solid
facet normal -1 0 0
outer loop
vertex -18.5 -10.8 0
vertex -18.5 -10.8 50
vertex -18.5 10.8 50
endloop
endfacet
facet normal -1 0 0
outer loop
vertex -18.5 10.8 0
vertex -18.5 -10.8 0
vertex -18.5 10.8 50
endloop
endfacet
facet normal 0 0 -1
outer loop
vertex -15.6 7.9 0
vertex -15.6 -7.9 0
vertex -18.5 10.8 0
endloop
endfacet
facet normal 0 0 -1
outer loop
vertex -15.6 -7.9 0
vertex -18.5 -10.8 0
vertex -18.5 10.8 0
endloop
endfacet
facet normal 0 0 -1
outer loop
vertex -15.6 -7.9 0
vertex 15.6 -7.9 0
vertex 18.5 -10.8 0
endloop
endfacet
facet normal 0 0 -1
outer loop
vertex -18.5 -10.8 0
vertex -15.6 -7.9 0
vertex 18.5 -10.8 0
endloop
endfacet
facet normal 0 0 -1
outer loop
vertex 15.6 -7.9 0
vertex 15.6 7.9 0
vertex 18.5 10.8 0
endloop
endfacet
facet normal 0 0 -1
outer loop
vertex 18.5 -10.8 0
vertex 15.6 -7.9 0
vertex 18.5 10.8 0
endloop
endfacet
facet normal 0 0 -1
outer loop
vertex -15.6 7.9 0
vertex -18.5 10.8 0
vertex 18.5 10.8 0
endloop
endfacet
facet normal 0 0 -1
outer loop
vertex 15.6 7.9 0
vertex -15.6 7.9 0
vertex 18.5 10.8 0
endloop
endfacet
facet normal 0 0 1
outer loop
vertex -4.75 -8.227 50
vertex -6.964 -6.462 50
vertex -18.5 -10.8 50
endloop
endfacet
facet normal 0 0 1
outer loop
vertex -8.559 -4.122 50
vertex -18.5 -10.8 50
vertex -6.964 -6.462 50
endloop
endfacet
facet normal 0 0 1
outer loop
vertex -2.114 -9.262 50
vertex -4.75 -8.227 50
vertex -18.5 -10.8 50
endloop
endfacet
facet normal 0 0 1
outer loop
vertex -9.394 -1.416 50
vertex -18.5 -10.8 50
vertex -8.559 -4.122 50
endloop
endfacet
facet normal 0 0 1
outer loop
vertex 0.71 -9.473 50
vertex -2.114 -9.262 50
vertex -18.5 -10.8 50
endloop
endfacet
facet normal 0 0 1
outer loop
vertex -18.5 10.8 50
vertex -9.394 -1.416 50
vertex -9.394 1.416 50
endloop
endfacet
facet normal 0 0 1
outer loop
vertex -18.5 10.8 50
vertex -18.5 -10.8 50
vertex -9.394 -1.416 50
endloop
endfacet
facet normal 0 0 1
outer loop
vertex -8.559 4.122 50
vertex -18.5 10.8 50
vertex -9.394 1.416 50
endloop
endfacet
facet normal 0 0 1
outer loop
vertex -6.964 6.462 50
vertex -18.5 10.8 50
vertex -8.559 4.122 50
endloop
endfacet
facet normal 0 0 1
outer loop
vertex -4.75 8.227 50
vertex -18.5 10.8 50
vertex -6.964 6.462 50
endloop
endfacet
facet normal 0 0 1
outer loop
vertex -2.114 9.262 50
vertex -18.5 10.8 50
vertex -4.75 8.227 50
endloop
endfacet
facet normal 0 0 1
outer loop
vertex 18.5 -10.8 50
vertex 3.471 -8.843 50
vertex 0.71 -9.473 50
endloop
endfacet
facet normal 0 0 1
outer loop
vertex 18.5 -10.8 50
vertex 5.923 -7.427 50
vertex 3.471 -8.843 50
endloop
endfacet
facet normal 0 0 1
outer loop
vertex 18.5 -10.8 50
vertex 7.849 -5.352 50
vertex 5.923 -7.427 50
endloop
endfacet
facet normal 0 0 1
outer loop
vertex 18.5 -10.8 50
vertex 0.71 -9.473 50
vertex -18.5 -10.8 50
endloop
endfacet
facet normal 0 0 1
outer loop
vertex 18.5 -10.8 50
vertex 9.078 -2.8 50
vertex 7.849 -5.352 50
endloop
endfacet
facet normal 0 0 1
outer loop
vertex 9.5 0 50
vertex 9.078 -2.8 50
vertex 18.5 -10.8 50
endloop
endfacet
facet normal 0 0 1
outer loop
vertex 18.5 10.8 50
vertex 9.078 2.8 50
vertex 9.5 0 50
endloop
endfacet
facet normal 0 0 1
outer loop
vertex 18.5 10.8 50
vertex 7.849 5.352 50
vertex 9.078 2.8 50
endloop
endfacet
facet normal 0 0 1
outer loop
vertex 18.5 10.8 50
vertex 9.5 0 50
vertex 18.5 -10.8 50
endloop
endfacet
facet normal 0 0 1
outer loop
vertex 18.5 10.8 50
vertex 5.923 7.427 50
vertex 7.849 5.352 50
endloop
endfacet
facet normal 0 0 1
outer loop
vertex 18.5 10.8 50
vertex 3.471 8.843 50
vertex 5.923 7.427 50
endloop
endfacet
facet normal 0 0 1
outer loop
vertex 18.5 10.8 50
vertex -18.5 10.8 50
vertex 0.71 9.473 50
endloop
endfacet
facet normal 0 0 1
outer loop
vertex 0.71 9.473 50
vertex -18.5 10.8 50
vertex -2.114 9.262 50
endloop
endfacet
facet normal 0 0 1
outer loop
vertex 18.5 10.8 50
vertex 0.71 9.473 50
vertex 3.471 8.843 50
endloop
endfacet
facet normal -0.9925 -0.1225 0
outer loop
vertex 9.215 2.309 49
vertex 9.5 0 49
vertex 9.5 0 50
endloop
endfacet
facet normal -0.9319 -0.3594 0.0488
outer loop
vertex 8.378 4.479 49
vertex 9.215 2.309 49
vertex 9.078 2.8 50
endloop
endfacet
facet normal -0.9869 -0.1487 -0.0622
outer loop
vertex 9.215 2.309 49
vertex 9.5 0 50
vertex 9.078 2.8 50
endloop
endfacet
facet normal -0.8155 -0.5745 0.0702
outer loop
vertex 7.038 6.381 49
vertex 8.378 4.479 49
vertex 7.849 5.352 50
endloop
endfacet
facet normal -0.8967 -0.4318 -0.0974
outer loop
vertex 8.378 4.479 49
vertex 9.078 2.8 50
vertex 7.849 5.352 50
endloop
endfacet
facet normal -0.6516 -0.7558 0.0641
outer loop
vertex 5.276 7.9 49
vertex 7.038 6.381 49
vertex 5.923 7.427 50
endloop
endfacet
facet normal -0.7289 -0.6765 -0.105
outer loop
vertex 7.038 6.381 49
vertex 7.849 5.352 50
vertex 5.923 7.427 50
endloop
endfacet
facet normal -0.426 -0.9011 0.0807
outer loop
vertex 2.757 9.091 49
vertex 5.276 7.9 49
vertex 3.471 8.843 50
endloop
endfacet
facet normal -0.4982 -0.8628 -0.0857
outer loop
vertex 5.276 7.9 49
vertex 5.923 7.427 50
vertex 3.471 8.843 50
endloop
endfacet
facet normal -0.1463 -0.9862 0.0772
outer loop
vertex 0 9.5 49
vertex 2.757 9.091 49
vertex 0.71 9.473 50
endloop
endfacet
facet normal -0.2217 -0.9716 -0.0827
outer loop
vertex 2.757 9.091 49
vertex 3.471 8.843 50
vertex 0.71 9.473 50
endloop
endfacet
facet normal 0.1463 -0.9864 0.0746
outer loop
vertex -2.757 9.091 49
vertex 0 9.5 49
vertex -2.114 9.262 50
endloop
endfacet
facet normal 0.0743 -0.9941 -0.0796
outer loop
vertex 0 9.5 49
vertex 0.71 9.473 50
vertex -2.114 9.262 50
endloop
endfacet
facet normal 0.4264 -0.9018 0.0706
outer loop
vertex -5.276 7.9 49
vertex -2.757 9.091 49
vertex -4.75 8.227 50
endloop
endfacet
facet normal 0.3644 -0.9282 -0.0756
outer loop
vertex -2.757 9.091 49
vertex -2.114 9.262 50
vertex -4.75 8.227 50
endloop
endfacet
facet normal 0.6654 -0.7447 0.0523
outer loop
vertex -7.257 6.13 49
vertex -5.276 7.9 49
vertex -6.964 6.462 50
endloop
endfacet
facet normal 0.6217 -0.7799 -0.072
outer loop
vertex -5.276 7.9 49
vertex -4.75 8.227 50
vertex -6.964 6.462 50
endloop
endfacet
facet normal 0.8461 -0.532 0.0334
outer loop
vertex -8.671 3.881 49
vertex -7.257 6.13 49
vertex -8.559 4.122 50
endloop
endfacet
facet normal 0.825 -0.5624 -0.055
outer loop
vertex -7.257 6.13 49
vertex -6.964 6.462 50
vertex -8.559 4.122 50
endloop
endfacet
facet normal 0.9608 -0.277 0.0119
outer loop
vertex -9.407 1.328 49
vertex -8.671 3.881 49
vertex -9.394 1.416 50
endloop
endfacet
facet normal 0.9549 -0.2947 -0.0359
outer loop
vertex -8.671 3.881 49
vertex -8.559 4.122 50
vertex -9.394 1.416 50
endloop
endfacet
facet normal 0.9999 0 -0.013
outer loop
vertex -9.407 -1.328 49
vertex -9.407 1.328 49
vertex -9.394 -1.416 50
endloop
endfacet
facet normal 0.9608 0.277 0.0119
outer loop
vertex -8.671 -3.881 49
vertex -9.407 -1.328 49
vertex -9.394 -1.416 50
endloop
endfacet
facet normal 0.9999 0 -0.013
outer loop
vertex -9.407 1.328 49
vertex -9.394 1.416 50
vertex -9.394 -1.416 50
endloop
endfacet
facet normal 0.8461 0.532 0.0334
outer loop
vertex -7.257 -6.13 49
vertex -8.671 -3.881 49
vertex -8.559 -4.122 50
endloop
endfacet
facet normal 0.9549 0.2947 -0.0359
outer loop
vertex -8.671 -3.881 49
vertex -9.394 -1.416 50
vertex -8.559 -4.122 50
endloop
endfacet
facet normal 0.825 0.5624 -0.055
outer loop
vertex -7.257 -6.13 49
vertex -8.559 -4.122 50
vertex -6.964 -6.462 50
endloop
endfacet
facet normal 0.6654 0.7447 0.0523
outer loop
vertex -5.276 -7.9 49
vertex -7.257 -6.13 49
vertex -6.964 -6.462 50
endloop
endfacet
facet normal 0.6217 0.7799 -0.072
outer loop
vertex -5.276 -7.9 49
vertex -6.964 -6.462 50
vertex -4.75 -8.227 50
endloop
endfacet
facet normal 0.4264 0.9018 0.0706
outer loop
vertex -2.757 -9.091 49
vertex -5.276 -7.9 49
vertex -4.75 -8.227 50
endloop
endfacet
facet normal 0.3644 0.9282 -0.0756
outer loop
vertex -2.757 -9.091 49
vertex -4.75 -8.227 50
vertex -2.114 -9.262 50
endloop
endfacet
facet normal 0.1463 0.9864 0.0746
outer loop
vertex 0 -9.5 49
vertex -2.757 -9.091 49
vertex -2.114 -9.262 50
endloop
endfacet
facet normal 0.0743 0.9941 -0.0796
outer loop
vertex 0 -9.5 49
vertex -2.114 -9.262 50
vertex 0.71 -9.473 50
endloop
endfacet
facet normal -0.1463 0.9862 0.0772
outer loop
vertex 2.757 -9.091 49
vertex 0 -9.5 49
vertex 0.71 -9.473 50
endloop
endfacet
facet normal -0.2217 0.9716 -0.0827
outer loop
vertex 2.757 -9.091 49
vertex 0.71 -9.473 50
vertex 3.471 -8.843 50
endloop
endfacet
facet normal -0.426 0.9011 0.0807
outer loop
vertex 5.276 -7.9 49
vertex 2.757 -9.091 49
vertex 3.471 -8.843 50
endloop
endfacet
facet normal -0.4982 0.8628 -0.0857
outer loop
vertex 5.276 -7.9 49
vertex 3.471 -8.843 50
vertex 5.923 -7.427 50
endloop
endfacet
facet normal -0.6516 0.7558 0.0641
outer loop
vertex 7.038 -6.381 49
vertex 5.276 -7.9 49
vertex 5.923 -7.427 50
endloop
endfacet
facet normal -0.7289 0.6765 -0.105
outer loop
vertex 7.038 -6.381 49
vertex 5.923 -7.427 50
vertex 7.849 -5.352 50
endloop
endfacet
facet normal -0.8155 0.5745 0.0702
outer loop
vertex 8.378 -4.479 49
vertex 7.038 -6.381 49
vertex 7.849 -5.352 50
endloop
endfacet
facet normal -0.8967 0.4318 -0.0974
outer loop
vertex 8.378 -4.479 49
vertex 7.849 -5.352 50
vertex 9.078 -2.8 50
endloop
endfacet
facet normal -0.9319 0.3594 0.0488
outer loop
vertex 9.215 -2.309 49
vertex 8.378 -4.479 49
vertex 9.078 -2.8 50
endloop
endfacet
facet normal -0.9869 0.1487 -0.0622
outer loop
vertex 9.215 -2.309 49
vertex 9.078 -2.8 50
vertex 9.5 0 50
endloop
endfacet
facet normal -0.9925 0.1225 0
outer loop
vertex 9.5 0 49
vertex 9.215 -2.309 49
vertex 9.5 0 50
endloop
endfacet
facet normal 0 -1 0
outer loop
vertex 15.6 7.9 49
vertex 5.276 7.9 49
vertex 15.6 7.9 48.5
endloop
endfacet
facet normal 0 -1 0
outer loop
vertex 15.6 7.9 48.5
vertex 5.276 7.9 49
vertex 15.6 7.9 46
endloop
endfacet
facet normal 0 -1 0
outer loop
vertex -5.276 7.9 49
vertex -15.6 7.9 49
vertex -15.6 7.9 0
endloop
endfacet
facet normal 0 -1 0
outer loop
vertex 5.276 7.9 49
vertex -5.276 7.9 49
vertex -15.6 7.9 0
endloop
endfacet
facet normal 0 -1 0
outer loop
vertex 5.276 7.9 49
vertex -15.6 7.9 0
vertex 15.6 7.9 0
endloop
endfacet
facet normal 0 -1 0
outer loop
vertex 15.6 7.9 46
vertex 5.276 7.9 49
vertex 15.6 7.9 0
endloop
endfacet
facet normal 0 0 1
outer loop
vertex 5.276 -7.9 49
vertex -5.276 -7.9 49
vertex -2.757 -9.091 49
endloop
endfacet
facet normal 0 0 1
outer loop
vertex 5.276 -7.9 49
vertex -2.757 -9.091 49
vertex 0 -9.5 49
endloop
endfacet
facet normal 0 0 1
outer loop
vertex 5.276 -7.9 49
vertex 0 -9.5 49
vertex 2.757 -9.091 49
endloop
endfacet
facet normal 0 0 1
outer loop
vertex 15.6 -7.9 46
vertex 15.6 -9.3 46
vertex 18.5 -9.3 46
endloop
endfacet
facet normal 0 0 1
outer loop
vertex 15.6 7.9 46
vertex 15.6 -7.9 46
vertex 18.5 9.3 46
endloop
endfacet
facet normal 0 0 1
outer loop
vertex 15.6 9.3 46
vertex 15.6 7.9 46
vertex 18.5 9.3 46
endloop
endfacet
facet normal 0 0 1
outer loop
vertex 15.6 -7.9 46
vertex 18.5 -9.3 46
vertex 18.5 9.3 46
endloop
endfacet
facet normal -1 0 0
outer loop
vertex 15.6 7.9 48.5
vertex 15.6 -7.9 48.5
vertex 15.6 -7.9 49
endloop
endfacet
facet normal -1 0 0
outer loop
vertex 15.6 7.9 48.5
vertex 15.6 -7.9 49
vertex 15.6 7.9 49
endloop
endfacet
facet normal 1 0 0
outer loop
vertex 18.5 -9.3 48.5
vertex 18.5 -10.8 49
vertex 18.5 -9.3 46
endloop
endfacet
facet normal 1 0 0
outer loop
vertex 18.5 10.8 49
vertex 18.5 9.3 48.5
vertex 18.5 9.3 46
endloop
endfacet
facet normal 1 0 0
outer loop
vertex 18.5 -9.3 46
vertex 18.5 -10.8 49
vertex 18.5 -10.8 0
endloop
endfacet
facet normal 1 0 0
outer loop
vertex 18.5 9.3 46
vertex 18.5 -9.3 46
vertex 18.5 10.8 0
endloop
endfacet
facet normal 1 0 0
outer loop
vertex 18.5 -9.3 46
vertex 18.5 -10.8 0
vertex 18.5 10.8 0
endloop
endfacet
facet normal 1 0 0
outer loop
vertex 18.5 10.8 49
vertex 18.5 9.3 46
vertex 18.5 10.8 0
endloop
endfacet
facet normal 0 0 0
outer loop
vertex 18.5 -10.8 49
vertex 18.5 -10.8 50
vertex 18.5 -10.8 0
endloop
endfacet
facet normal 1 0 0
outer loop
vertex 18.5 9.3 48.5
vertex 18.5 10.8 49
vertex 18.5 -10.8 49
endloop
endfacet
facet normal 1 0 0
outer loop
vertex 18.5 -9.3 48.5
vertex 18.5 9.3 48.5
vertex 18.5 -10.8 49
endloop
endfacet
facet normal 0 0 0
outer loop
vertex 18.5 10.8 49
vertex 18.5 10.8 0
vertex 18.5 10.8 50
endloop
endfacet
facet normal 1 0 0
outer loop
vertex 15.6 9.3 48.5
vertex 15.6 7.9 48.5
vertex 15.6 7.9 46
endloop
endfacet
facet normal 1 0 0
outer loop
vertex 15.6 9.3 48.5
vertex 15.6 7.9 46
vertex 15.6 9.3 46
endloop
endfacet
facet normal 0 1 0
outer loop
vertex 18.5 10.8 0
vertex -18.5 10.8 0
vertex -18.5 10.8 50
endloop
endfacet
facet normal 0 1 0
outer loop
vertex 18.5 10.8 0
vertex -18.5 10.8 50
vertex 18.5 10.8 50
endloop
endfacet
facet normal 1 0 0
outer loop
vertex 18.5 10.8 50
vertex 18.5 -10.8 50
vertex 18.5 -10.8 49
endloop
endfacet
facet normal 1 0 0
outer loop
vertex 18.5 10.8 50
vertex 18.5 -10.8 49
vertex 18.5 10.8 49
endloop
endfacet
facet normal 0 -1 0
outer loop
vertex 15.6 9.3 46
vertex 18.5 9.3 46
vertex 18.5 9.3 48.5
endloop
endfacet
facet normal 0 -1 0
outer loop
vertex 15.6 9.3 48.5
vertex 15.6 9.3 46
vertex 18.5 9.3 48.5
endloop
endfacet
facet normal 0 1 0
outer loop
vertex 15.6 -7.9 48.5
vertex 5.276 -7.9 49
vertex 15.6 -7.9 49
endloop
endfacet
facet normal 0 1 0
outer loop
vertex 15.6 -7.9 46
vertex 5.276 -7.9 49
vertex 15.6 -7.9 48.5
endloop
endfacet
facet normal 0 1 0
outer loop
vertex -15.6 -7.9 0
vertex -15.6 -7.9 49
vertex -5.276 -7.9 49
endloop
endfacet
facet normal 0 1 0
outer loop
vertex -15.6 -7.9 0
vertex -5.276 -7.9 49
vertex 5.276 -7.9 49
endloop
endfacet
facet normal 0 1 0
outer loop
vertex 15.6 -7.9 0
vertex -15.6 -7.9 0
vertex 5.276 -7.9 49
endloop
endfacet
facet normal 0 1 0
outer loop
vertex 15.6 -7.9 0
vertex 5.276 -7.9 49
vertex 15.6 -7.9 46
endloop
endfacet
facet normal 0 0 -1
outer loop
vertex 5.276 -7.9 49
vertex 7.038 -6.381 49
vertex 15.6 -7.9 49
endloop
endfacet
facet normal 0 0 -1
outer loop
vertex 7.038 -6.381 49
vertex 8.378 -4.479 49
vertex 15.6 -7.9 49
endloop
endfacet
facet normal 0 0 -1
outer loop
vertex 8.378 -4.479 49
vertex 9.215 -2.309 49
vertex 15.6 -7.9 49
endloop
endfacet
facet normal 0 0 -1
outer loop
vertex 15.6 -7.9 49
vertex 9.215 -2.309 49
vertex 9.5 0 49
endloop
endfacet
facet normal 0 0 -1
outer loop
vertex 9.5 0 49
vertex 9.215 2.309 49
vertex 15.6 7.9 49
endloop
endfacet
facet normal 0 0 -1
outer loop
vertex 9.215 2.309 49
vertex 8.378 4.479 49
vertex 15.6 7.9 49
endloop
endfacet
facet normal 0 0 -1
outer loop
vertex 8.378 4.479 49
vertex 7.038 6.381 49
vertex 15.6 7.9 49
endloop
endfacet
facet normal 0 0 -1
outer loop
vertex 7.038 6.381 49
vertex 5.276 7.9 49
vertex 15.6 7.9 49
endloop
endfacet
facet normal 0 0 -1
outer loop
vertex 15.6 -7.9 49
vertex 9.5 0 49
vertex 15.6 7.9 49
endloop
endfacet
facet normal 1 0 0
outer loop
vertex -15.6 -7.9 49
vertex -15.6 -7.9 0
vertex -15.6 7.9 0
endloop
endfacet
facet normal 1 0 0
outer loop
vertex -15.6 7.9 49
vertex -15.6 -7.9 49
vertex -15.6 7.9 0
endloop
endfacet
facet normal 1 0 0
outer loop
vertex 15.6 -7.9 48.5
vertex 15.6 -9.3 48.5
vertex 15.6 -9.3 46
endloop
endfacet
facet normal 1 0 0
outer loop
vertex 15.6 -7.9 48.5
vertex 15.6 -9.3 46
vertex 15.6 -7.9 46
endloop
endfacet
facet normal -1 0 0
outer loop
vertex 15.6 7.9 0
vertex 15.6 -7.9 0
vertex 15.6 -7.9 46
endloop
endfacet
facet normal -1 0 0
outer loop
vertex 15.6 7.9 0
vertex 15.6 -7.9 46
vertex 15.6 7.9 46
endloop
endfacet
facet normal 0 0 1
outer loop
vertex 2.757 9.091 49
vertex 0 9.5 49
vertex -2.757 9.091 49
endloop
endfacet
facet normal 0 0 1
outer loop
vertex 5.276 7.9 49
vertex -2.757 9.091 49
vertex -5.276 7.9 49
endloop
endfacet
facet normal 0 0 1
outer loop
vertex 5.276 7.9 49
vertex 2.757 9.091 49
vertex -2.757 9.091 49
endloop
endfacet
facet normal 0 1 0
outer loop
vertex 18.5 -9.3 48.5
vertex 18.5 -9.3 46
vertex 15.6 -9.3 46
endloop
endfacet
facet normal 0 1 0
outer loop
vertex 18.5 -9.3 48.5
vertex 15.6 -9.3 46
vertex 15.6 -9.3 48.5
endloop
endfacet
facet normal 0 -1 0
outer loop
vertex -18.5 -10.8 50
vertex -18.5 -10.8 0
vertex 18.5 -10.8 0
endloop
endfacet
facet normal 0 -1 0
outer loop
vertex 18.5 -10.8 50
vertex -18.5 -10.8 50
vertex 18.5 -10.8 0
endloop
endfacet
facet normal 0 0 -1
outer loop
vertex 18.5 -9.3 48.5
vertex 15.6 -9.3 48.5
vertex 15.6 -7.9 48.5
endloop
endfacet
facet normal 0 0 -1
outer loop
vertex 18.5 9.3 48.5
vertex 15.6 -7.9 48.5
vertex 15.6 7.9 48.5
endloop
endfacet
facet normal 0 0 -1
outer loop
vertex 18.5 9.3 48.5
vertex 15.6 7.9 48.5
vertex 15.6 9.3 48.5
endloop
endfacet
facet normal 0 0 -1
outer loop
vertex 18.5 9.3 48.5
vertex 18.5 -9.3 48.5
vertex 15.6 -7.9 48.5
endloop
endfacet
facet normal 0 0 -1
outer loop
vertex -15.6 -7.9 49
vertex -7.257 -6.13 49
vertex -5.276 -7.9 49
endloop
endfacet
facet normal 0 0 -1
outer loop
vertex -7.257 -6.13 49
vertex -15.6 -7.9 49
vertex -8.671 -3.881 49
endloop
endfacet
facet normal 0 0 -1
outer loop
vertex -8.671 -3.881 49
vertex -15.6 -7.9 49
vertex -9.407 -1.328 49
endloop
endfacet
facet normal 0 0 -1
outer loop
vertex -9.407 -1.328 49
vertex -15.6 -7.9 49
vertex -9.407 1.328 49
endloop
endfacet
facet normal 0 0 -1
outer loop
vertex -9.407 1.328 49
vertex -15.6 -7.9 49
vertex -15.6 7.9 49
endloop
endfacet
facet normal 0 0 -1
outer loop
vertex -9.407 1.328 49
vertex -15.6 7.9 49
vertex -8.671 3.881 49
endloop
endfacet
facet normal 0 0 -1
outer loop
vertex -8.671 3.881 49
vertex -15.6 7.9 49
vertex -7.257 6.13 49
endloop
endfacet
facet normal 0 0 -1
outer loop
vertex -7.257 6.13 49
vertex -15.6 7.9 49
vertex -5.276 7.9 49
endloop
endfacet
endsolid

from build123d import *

# Parameters (mm, degrees)
F0_W            = 37
F0_H            = 21.6
F4_DEPTH        = 50
F5_T            = -2.9
F6_W            = 18.6
F6_H            = 2.5
F7_DEPTH        = 2.9
F8_W            = 36.999993
F8_H            = 21.599919
F9_DEPTH        = 1
F10_D           = 15.5
F10_CBORE_D     = 19
F10_CBORE_DEPTH = 1


with BuildPart() as f4:
    # F0 (on Top) → F4 (new body)
    with BuildSketch(Plane.XY):
        Rectangle(F0_W, F0_H)
    extrude(amount=F4_DEPTH)

    # F5
    f5_openings = [f4.faces().sort_by_distance(p)[0] for p in [
        (0, 0, 50),
        (0, 0, 0),
    ]]
    offset(amount=F5_T, openings=f5_openings)

    # F6 (on face) → F7 (cut)
    with BuildSketch(Plane.YZ.offset(18.5)):
        with Locations((0, 47.25)):
            Rectangle(F6_W, F6_H)
    extrude(amount=-F7_DEPTH, mode=Mode.SUBTRACT)

    # F8 (on offset) → F9 (join)
    with BuildSketch(Plane.XY.offset(50)):
        with Locations((1.5e-05, -3.1e-05)):
            Rectangle(F8_W, F8_H)
    extrude(amount=-F9_DEPTH)

    # F10 (through all)
    with Locations(Plane.XY.offset(50)):
        with Locations((0, 0)):
            CounterBoreHole(F10_D / 2, F10_CBORE_D / 2, F10_CBORE_DEPTH)


solid = f4.part
